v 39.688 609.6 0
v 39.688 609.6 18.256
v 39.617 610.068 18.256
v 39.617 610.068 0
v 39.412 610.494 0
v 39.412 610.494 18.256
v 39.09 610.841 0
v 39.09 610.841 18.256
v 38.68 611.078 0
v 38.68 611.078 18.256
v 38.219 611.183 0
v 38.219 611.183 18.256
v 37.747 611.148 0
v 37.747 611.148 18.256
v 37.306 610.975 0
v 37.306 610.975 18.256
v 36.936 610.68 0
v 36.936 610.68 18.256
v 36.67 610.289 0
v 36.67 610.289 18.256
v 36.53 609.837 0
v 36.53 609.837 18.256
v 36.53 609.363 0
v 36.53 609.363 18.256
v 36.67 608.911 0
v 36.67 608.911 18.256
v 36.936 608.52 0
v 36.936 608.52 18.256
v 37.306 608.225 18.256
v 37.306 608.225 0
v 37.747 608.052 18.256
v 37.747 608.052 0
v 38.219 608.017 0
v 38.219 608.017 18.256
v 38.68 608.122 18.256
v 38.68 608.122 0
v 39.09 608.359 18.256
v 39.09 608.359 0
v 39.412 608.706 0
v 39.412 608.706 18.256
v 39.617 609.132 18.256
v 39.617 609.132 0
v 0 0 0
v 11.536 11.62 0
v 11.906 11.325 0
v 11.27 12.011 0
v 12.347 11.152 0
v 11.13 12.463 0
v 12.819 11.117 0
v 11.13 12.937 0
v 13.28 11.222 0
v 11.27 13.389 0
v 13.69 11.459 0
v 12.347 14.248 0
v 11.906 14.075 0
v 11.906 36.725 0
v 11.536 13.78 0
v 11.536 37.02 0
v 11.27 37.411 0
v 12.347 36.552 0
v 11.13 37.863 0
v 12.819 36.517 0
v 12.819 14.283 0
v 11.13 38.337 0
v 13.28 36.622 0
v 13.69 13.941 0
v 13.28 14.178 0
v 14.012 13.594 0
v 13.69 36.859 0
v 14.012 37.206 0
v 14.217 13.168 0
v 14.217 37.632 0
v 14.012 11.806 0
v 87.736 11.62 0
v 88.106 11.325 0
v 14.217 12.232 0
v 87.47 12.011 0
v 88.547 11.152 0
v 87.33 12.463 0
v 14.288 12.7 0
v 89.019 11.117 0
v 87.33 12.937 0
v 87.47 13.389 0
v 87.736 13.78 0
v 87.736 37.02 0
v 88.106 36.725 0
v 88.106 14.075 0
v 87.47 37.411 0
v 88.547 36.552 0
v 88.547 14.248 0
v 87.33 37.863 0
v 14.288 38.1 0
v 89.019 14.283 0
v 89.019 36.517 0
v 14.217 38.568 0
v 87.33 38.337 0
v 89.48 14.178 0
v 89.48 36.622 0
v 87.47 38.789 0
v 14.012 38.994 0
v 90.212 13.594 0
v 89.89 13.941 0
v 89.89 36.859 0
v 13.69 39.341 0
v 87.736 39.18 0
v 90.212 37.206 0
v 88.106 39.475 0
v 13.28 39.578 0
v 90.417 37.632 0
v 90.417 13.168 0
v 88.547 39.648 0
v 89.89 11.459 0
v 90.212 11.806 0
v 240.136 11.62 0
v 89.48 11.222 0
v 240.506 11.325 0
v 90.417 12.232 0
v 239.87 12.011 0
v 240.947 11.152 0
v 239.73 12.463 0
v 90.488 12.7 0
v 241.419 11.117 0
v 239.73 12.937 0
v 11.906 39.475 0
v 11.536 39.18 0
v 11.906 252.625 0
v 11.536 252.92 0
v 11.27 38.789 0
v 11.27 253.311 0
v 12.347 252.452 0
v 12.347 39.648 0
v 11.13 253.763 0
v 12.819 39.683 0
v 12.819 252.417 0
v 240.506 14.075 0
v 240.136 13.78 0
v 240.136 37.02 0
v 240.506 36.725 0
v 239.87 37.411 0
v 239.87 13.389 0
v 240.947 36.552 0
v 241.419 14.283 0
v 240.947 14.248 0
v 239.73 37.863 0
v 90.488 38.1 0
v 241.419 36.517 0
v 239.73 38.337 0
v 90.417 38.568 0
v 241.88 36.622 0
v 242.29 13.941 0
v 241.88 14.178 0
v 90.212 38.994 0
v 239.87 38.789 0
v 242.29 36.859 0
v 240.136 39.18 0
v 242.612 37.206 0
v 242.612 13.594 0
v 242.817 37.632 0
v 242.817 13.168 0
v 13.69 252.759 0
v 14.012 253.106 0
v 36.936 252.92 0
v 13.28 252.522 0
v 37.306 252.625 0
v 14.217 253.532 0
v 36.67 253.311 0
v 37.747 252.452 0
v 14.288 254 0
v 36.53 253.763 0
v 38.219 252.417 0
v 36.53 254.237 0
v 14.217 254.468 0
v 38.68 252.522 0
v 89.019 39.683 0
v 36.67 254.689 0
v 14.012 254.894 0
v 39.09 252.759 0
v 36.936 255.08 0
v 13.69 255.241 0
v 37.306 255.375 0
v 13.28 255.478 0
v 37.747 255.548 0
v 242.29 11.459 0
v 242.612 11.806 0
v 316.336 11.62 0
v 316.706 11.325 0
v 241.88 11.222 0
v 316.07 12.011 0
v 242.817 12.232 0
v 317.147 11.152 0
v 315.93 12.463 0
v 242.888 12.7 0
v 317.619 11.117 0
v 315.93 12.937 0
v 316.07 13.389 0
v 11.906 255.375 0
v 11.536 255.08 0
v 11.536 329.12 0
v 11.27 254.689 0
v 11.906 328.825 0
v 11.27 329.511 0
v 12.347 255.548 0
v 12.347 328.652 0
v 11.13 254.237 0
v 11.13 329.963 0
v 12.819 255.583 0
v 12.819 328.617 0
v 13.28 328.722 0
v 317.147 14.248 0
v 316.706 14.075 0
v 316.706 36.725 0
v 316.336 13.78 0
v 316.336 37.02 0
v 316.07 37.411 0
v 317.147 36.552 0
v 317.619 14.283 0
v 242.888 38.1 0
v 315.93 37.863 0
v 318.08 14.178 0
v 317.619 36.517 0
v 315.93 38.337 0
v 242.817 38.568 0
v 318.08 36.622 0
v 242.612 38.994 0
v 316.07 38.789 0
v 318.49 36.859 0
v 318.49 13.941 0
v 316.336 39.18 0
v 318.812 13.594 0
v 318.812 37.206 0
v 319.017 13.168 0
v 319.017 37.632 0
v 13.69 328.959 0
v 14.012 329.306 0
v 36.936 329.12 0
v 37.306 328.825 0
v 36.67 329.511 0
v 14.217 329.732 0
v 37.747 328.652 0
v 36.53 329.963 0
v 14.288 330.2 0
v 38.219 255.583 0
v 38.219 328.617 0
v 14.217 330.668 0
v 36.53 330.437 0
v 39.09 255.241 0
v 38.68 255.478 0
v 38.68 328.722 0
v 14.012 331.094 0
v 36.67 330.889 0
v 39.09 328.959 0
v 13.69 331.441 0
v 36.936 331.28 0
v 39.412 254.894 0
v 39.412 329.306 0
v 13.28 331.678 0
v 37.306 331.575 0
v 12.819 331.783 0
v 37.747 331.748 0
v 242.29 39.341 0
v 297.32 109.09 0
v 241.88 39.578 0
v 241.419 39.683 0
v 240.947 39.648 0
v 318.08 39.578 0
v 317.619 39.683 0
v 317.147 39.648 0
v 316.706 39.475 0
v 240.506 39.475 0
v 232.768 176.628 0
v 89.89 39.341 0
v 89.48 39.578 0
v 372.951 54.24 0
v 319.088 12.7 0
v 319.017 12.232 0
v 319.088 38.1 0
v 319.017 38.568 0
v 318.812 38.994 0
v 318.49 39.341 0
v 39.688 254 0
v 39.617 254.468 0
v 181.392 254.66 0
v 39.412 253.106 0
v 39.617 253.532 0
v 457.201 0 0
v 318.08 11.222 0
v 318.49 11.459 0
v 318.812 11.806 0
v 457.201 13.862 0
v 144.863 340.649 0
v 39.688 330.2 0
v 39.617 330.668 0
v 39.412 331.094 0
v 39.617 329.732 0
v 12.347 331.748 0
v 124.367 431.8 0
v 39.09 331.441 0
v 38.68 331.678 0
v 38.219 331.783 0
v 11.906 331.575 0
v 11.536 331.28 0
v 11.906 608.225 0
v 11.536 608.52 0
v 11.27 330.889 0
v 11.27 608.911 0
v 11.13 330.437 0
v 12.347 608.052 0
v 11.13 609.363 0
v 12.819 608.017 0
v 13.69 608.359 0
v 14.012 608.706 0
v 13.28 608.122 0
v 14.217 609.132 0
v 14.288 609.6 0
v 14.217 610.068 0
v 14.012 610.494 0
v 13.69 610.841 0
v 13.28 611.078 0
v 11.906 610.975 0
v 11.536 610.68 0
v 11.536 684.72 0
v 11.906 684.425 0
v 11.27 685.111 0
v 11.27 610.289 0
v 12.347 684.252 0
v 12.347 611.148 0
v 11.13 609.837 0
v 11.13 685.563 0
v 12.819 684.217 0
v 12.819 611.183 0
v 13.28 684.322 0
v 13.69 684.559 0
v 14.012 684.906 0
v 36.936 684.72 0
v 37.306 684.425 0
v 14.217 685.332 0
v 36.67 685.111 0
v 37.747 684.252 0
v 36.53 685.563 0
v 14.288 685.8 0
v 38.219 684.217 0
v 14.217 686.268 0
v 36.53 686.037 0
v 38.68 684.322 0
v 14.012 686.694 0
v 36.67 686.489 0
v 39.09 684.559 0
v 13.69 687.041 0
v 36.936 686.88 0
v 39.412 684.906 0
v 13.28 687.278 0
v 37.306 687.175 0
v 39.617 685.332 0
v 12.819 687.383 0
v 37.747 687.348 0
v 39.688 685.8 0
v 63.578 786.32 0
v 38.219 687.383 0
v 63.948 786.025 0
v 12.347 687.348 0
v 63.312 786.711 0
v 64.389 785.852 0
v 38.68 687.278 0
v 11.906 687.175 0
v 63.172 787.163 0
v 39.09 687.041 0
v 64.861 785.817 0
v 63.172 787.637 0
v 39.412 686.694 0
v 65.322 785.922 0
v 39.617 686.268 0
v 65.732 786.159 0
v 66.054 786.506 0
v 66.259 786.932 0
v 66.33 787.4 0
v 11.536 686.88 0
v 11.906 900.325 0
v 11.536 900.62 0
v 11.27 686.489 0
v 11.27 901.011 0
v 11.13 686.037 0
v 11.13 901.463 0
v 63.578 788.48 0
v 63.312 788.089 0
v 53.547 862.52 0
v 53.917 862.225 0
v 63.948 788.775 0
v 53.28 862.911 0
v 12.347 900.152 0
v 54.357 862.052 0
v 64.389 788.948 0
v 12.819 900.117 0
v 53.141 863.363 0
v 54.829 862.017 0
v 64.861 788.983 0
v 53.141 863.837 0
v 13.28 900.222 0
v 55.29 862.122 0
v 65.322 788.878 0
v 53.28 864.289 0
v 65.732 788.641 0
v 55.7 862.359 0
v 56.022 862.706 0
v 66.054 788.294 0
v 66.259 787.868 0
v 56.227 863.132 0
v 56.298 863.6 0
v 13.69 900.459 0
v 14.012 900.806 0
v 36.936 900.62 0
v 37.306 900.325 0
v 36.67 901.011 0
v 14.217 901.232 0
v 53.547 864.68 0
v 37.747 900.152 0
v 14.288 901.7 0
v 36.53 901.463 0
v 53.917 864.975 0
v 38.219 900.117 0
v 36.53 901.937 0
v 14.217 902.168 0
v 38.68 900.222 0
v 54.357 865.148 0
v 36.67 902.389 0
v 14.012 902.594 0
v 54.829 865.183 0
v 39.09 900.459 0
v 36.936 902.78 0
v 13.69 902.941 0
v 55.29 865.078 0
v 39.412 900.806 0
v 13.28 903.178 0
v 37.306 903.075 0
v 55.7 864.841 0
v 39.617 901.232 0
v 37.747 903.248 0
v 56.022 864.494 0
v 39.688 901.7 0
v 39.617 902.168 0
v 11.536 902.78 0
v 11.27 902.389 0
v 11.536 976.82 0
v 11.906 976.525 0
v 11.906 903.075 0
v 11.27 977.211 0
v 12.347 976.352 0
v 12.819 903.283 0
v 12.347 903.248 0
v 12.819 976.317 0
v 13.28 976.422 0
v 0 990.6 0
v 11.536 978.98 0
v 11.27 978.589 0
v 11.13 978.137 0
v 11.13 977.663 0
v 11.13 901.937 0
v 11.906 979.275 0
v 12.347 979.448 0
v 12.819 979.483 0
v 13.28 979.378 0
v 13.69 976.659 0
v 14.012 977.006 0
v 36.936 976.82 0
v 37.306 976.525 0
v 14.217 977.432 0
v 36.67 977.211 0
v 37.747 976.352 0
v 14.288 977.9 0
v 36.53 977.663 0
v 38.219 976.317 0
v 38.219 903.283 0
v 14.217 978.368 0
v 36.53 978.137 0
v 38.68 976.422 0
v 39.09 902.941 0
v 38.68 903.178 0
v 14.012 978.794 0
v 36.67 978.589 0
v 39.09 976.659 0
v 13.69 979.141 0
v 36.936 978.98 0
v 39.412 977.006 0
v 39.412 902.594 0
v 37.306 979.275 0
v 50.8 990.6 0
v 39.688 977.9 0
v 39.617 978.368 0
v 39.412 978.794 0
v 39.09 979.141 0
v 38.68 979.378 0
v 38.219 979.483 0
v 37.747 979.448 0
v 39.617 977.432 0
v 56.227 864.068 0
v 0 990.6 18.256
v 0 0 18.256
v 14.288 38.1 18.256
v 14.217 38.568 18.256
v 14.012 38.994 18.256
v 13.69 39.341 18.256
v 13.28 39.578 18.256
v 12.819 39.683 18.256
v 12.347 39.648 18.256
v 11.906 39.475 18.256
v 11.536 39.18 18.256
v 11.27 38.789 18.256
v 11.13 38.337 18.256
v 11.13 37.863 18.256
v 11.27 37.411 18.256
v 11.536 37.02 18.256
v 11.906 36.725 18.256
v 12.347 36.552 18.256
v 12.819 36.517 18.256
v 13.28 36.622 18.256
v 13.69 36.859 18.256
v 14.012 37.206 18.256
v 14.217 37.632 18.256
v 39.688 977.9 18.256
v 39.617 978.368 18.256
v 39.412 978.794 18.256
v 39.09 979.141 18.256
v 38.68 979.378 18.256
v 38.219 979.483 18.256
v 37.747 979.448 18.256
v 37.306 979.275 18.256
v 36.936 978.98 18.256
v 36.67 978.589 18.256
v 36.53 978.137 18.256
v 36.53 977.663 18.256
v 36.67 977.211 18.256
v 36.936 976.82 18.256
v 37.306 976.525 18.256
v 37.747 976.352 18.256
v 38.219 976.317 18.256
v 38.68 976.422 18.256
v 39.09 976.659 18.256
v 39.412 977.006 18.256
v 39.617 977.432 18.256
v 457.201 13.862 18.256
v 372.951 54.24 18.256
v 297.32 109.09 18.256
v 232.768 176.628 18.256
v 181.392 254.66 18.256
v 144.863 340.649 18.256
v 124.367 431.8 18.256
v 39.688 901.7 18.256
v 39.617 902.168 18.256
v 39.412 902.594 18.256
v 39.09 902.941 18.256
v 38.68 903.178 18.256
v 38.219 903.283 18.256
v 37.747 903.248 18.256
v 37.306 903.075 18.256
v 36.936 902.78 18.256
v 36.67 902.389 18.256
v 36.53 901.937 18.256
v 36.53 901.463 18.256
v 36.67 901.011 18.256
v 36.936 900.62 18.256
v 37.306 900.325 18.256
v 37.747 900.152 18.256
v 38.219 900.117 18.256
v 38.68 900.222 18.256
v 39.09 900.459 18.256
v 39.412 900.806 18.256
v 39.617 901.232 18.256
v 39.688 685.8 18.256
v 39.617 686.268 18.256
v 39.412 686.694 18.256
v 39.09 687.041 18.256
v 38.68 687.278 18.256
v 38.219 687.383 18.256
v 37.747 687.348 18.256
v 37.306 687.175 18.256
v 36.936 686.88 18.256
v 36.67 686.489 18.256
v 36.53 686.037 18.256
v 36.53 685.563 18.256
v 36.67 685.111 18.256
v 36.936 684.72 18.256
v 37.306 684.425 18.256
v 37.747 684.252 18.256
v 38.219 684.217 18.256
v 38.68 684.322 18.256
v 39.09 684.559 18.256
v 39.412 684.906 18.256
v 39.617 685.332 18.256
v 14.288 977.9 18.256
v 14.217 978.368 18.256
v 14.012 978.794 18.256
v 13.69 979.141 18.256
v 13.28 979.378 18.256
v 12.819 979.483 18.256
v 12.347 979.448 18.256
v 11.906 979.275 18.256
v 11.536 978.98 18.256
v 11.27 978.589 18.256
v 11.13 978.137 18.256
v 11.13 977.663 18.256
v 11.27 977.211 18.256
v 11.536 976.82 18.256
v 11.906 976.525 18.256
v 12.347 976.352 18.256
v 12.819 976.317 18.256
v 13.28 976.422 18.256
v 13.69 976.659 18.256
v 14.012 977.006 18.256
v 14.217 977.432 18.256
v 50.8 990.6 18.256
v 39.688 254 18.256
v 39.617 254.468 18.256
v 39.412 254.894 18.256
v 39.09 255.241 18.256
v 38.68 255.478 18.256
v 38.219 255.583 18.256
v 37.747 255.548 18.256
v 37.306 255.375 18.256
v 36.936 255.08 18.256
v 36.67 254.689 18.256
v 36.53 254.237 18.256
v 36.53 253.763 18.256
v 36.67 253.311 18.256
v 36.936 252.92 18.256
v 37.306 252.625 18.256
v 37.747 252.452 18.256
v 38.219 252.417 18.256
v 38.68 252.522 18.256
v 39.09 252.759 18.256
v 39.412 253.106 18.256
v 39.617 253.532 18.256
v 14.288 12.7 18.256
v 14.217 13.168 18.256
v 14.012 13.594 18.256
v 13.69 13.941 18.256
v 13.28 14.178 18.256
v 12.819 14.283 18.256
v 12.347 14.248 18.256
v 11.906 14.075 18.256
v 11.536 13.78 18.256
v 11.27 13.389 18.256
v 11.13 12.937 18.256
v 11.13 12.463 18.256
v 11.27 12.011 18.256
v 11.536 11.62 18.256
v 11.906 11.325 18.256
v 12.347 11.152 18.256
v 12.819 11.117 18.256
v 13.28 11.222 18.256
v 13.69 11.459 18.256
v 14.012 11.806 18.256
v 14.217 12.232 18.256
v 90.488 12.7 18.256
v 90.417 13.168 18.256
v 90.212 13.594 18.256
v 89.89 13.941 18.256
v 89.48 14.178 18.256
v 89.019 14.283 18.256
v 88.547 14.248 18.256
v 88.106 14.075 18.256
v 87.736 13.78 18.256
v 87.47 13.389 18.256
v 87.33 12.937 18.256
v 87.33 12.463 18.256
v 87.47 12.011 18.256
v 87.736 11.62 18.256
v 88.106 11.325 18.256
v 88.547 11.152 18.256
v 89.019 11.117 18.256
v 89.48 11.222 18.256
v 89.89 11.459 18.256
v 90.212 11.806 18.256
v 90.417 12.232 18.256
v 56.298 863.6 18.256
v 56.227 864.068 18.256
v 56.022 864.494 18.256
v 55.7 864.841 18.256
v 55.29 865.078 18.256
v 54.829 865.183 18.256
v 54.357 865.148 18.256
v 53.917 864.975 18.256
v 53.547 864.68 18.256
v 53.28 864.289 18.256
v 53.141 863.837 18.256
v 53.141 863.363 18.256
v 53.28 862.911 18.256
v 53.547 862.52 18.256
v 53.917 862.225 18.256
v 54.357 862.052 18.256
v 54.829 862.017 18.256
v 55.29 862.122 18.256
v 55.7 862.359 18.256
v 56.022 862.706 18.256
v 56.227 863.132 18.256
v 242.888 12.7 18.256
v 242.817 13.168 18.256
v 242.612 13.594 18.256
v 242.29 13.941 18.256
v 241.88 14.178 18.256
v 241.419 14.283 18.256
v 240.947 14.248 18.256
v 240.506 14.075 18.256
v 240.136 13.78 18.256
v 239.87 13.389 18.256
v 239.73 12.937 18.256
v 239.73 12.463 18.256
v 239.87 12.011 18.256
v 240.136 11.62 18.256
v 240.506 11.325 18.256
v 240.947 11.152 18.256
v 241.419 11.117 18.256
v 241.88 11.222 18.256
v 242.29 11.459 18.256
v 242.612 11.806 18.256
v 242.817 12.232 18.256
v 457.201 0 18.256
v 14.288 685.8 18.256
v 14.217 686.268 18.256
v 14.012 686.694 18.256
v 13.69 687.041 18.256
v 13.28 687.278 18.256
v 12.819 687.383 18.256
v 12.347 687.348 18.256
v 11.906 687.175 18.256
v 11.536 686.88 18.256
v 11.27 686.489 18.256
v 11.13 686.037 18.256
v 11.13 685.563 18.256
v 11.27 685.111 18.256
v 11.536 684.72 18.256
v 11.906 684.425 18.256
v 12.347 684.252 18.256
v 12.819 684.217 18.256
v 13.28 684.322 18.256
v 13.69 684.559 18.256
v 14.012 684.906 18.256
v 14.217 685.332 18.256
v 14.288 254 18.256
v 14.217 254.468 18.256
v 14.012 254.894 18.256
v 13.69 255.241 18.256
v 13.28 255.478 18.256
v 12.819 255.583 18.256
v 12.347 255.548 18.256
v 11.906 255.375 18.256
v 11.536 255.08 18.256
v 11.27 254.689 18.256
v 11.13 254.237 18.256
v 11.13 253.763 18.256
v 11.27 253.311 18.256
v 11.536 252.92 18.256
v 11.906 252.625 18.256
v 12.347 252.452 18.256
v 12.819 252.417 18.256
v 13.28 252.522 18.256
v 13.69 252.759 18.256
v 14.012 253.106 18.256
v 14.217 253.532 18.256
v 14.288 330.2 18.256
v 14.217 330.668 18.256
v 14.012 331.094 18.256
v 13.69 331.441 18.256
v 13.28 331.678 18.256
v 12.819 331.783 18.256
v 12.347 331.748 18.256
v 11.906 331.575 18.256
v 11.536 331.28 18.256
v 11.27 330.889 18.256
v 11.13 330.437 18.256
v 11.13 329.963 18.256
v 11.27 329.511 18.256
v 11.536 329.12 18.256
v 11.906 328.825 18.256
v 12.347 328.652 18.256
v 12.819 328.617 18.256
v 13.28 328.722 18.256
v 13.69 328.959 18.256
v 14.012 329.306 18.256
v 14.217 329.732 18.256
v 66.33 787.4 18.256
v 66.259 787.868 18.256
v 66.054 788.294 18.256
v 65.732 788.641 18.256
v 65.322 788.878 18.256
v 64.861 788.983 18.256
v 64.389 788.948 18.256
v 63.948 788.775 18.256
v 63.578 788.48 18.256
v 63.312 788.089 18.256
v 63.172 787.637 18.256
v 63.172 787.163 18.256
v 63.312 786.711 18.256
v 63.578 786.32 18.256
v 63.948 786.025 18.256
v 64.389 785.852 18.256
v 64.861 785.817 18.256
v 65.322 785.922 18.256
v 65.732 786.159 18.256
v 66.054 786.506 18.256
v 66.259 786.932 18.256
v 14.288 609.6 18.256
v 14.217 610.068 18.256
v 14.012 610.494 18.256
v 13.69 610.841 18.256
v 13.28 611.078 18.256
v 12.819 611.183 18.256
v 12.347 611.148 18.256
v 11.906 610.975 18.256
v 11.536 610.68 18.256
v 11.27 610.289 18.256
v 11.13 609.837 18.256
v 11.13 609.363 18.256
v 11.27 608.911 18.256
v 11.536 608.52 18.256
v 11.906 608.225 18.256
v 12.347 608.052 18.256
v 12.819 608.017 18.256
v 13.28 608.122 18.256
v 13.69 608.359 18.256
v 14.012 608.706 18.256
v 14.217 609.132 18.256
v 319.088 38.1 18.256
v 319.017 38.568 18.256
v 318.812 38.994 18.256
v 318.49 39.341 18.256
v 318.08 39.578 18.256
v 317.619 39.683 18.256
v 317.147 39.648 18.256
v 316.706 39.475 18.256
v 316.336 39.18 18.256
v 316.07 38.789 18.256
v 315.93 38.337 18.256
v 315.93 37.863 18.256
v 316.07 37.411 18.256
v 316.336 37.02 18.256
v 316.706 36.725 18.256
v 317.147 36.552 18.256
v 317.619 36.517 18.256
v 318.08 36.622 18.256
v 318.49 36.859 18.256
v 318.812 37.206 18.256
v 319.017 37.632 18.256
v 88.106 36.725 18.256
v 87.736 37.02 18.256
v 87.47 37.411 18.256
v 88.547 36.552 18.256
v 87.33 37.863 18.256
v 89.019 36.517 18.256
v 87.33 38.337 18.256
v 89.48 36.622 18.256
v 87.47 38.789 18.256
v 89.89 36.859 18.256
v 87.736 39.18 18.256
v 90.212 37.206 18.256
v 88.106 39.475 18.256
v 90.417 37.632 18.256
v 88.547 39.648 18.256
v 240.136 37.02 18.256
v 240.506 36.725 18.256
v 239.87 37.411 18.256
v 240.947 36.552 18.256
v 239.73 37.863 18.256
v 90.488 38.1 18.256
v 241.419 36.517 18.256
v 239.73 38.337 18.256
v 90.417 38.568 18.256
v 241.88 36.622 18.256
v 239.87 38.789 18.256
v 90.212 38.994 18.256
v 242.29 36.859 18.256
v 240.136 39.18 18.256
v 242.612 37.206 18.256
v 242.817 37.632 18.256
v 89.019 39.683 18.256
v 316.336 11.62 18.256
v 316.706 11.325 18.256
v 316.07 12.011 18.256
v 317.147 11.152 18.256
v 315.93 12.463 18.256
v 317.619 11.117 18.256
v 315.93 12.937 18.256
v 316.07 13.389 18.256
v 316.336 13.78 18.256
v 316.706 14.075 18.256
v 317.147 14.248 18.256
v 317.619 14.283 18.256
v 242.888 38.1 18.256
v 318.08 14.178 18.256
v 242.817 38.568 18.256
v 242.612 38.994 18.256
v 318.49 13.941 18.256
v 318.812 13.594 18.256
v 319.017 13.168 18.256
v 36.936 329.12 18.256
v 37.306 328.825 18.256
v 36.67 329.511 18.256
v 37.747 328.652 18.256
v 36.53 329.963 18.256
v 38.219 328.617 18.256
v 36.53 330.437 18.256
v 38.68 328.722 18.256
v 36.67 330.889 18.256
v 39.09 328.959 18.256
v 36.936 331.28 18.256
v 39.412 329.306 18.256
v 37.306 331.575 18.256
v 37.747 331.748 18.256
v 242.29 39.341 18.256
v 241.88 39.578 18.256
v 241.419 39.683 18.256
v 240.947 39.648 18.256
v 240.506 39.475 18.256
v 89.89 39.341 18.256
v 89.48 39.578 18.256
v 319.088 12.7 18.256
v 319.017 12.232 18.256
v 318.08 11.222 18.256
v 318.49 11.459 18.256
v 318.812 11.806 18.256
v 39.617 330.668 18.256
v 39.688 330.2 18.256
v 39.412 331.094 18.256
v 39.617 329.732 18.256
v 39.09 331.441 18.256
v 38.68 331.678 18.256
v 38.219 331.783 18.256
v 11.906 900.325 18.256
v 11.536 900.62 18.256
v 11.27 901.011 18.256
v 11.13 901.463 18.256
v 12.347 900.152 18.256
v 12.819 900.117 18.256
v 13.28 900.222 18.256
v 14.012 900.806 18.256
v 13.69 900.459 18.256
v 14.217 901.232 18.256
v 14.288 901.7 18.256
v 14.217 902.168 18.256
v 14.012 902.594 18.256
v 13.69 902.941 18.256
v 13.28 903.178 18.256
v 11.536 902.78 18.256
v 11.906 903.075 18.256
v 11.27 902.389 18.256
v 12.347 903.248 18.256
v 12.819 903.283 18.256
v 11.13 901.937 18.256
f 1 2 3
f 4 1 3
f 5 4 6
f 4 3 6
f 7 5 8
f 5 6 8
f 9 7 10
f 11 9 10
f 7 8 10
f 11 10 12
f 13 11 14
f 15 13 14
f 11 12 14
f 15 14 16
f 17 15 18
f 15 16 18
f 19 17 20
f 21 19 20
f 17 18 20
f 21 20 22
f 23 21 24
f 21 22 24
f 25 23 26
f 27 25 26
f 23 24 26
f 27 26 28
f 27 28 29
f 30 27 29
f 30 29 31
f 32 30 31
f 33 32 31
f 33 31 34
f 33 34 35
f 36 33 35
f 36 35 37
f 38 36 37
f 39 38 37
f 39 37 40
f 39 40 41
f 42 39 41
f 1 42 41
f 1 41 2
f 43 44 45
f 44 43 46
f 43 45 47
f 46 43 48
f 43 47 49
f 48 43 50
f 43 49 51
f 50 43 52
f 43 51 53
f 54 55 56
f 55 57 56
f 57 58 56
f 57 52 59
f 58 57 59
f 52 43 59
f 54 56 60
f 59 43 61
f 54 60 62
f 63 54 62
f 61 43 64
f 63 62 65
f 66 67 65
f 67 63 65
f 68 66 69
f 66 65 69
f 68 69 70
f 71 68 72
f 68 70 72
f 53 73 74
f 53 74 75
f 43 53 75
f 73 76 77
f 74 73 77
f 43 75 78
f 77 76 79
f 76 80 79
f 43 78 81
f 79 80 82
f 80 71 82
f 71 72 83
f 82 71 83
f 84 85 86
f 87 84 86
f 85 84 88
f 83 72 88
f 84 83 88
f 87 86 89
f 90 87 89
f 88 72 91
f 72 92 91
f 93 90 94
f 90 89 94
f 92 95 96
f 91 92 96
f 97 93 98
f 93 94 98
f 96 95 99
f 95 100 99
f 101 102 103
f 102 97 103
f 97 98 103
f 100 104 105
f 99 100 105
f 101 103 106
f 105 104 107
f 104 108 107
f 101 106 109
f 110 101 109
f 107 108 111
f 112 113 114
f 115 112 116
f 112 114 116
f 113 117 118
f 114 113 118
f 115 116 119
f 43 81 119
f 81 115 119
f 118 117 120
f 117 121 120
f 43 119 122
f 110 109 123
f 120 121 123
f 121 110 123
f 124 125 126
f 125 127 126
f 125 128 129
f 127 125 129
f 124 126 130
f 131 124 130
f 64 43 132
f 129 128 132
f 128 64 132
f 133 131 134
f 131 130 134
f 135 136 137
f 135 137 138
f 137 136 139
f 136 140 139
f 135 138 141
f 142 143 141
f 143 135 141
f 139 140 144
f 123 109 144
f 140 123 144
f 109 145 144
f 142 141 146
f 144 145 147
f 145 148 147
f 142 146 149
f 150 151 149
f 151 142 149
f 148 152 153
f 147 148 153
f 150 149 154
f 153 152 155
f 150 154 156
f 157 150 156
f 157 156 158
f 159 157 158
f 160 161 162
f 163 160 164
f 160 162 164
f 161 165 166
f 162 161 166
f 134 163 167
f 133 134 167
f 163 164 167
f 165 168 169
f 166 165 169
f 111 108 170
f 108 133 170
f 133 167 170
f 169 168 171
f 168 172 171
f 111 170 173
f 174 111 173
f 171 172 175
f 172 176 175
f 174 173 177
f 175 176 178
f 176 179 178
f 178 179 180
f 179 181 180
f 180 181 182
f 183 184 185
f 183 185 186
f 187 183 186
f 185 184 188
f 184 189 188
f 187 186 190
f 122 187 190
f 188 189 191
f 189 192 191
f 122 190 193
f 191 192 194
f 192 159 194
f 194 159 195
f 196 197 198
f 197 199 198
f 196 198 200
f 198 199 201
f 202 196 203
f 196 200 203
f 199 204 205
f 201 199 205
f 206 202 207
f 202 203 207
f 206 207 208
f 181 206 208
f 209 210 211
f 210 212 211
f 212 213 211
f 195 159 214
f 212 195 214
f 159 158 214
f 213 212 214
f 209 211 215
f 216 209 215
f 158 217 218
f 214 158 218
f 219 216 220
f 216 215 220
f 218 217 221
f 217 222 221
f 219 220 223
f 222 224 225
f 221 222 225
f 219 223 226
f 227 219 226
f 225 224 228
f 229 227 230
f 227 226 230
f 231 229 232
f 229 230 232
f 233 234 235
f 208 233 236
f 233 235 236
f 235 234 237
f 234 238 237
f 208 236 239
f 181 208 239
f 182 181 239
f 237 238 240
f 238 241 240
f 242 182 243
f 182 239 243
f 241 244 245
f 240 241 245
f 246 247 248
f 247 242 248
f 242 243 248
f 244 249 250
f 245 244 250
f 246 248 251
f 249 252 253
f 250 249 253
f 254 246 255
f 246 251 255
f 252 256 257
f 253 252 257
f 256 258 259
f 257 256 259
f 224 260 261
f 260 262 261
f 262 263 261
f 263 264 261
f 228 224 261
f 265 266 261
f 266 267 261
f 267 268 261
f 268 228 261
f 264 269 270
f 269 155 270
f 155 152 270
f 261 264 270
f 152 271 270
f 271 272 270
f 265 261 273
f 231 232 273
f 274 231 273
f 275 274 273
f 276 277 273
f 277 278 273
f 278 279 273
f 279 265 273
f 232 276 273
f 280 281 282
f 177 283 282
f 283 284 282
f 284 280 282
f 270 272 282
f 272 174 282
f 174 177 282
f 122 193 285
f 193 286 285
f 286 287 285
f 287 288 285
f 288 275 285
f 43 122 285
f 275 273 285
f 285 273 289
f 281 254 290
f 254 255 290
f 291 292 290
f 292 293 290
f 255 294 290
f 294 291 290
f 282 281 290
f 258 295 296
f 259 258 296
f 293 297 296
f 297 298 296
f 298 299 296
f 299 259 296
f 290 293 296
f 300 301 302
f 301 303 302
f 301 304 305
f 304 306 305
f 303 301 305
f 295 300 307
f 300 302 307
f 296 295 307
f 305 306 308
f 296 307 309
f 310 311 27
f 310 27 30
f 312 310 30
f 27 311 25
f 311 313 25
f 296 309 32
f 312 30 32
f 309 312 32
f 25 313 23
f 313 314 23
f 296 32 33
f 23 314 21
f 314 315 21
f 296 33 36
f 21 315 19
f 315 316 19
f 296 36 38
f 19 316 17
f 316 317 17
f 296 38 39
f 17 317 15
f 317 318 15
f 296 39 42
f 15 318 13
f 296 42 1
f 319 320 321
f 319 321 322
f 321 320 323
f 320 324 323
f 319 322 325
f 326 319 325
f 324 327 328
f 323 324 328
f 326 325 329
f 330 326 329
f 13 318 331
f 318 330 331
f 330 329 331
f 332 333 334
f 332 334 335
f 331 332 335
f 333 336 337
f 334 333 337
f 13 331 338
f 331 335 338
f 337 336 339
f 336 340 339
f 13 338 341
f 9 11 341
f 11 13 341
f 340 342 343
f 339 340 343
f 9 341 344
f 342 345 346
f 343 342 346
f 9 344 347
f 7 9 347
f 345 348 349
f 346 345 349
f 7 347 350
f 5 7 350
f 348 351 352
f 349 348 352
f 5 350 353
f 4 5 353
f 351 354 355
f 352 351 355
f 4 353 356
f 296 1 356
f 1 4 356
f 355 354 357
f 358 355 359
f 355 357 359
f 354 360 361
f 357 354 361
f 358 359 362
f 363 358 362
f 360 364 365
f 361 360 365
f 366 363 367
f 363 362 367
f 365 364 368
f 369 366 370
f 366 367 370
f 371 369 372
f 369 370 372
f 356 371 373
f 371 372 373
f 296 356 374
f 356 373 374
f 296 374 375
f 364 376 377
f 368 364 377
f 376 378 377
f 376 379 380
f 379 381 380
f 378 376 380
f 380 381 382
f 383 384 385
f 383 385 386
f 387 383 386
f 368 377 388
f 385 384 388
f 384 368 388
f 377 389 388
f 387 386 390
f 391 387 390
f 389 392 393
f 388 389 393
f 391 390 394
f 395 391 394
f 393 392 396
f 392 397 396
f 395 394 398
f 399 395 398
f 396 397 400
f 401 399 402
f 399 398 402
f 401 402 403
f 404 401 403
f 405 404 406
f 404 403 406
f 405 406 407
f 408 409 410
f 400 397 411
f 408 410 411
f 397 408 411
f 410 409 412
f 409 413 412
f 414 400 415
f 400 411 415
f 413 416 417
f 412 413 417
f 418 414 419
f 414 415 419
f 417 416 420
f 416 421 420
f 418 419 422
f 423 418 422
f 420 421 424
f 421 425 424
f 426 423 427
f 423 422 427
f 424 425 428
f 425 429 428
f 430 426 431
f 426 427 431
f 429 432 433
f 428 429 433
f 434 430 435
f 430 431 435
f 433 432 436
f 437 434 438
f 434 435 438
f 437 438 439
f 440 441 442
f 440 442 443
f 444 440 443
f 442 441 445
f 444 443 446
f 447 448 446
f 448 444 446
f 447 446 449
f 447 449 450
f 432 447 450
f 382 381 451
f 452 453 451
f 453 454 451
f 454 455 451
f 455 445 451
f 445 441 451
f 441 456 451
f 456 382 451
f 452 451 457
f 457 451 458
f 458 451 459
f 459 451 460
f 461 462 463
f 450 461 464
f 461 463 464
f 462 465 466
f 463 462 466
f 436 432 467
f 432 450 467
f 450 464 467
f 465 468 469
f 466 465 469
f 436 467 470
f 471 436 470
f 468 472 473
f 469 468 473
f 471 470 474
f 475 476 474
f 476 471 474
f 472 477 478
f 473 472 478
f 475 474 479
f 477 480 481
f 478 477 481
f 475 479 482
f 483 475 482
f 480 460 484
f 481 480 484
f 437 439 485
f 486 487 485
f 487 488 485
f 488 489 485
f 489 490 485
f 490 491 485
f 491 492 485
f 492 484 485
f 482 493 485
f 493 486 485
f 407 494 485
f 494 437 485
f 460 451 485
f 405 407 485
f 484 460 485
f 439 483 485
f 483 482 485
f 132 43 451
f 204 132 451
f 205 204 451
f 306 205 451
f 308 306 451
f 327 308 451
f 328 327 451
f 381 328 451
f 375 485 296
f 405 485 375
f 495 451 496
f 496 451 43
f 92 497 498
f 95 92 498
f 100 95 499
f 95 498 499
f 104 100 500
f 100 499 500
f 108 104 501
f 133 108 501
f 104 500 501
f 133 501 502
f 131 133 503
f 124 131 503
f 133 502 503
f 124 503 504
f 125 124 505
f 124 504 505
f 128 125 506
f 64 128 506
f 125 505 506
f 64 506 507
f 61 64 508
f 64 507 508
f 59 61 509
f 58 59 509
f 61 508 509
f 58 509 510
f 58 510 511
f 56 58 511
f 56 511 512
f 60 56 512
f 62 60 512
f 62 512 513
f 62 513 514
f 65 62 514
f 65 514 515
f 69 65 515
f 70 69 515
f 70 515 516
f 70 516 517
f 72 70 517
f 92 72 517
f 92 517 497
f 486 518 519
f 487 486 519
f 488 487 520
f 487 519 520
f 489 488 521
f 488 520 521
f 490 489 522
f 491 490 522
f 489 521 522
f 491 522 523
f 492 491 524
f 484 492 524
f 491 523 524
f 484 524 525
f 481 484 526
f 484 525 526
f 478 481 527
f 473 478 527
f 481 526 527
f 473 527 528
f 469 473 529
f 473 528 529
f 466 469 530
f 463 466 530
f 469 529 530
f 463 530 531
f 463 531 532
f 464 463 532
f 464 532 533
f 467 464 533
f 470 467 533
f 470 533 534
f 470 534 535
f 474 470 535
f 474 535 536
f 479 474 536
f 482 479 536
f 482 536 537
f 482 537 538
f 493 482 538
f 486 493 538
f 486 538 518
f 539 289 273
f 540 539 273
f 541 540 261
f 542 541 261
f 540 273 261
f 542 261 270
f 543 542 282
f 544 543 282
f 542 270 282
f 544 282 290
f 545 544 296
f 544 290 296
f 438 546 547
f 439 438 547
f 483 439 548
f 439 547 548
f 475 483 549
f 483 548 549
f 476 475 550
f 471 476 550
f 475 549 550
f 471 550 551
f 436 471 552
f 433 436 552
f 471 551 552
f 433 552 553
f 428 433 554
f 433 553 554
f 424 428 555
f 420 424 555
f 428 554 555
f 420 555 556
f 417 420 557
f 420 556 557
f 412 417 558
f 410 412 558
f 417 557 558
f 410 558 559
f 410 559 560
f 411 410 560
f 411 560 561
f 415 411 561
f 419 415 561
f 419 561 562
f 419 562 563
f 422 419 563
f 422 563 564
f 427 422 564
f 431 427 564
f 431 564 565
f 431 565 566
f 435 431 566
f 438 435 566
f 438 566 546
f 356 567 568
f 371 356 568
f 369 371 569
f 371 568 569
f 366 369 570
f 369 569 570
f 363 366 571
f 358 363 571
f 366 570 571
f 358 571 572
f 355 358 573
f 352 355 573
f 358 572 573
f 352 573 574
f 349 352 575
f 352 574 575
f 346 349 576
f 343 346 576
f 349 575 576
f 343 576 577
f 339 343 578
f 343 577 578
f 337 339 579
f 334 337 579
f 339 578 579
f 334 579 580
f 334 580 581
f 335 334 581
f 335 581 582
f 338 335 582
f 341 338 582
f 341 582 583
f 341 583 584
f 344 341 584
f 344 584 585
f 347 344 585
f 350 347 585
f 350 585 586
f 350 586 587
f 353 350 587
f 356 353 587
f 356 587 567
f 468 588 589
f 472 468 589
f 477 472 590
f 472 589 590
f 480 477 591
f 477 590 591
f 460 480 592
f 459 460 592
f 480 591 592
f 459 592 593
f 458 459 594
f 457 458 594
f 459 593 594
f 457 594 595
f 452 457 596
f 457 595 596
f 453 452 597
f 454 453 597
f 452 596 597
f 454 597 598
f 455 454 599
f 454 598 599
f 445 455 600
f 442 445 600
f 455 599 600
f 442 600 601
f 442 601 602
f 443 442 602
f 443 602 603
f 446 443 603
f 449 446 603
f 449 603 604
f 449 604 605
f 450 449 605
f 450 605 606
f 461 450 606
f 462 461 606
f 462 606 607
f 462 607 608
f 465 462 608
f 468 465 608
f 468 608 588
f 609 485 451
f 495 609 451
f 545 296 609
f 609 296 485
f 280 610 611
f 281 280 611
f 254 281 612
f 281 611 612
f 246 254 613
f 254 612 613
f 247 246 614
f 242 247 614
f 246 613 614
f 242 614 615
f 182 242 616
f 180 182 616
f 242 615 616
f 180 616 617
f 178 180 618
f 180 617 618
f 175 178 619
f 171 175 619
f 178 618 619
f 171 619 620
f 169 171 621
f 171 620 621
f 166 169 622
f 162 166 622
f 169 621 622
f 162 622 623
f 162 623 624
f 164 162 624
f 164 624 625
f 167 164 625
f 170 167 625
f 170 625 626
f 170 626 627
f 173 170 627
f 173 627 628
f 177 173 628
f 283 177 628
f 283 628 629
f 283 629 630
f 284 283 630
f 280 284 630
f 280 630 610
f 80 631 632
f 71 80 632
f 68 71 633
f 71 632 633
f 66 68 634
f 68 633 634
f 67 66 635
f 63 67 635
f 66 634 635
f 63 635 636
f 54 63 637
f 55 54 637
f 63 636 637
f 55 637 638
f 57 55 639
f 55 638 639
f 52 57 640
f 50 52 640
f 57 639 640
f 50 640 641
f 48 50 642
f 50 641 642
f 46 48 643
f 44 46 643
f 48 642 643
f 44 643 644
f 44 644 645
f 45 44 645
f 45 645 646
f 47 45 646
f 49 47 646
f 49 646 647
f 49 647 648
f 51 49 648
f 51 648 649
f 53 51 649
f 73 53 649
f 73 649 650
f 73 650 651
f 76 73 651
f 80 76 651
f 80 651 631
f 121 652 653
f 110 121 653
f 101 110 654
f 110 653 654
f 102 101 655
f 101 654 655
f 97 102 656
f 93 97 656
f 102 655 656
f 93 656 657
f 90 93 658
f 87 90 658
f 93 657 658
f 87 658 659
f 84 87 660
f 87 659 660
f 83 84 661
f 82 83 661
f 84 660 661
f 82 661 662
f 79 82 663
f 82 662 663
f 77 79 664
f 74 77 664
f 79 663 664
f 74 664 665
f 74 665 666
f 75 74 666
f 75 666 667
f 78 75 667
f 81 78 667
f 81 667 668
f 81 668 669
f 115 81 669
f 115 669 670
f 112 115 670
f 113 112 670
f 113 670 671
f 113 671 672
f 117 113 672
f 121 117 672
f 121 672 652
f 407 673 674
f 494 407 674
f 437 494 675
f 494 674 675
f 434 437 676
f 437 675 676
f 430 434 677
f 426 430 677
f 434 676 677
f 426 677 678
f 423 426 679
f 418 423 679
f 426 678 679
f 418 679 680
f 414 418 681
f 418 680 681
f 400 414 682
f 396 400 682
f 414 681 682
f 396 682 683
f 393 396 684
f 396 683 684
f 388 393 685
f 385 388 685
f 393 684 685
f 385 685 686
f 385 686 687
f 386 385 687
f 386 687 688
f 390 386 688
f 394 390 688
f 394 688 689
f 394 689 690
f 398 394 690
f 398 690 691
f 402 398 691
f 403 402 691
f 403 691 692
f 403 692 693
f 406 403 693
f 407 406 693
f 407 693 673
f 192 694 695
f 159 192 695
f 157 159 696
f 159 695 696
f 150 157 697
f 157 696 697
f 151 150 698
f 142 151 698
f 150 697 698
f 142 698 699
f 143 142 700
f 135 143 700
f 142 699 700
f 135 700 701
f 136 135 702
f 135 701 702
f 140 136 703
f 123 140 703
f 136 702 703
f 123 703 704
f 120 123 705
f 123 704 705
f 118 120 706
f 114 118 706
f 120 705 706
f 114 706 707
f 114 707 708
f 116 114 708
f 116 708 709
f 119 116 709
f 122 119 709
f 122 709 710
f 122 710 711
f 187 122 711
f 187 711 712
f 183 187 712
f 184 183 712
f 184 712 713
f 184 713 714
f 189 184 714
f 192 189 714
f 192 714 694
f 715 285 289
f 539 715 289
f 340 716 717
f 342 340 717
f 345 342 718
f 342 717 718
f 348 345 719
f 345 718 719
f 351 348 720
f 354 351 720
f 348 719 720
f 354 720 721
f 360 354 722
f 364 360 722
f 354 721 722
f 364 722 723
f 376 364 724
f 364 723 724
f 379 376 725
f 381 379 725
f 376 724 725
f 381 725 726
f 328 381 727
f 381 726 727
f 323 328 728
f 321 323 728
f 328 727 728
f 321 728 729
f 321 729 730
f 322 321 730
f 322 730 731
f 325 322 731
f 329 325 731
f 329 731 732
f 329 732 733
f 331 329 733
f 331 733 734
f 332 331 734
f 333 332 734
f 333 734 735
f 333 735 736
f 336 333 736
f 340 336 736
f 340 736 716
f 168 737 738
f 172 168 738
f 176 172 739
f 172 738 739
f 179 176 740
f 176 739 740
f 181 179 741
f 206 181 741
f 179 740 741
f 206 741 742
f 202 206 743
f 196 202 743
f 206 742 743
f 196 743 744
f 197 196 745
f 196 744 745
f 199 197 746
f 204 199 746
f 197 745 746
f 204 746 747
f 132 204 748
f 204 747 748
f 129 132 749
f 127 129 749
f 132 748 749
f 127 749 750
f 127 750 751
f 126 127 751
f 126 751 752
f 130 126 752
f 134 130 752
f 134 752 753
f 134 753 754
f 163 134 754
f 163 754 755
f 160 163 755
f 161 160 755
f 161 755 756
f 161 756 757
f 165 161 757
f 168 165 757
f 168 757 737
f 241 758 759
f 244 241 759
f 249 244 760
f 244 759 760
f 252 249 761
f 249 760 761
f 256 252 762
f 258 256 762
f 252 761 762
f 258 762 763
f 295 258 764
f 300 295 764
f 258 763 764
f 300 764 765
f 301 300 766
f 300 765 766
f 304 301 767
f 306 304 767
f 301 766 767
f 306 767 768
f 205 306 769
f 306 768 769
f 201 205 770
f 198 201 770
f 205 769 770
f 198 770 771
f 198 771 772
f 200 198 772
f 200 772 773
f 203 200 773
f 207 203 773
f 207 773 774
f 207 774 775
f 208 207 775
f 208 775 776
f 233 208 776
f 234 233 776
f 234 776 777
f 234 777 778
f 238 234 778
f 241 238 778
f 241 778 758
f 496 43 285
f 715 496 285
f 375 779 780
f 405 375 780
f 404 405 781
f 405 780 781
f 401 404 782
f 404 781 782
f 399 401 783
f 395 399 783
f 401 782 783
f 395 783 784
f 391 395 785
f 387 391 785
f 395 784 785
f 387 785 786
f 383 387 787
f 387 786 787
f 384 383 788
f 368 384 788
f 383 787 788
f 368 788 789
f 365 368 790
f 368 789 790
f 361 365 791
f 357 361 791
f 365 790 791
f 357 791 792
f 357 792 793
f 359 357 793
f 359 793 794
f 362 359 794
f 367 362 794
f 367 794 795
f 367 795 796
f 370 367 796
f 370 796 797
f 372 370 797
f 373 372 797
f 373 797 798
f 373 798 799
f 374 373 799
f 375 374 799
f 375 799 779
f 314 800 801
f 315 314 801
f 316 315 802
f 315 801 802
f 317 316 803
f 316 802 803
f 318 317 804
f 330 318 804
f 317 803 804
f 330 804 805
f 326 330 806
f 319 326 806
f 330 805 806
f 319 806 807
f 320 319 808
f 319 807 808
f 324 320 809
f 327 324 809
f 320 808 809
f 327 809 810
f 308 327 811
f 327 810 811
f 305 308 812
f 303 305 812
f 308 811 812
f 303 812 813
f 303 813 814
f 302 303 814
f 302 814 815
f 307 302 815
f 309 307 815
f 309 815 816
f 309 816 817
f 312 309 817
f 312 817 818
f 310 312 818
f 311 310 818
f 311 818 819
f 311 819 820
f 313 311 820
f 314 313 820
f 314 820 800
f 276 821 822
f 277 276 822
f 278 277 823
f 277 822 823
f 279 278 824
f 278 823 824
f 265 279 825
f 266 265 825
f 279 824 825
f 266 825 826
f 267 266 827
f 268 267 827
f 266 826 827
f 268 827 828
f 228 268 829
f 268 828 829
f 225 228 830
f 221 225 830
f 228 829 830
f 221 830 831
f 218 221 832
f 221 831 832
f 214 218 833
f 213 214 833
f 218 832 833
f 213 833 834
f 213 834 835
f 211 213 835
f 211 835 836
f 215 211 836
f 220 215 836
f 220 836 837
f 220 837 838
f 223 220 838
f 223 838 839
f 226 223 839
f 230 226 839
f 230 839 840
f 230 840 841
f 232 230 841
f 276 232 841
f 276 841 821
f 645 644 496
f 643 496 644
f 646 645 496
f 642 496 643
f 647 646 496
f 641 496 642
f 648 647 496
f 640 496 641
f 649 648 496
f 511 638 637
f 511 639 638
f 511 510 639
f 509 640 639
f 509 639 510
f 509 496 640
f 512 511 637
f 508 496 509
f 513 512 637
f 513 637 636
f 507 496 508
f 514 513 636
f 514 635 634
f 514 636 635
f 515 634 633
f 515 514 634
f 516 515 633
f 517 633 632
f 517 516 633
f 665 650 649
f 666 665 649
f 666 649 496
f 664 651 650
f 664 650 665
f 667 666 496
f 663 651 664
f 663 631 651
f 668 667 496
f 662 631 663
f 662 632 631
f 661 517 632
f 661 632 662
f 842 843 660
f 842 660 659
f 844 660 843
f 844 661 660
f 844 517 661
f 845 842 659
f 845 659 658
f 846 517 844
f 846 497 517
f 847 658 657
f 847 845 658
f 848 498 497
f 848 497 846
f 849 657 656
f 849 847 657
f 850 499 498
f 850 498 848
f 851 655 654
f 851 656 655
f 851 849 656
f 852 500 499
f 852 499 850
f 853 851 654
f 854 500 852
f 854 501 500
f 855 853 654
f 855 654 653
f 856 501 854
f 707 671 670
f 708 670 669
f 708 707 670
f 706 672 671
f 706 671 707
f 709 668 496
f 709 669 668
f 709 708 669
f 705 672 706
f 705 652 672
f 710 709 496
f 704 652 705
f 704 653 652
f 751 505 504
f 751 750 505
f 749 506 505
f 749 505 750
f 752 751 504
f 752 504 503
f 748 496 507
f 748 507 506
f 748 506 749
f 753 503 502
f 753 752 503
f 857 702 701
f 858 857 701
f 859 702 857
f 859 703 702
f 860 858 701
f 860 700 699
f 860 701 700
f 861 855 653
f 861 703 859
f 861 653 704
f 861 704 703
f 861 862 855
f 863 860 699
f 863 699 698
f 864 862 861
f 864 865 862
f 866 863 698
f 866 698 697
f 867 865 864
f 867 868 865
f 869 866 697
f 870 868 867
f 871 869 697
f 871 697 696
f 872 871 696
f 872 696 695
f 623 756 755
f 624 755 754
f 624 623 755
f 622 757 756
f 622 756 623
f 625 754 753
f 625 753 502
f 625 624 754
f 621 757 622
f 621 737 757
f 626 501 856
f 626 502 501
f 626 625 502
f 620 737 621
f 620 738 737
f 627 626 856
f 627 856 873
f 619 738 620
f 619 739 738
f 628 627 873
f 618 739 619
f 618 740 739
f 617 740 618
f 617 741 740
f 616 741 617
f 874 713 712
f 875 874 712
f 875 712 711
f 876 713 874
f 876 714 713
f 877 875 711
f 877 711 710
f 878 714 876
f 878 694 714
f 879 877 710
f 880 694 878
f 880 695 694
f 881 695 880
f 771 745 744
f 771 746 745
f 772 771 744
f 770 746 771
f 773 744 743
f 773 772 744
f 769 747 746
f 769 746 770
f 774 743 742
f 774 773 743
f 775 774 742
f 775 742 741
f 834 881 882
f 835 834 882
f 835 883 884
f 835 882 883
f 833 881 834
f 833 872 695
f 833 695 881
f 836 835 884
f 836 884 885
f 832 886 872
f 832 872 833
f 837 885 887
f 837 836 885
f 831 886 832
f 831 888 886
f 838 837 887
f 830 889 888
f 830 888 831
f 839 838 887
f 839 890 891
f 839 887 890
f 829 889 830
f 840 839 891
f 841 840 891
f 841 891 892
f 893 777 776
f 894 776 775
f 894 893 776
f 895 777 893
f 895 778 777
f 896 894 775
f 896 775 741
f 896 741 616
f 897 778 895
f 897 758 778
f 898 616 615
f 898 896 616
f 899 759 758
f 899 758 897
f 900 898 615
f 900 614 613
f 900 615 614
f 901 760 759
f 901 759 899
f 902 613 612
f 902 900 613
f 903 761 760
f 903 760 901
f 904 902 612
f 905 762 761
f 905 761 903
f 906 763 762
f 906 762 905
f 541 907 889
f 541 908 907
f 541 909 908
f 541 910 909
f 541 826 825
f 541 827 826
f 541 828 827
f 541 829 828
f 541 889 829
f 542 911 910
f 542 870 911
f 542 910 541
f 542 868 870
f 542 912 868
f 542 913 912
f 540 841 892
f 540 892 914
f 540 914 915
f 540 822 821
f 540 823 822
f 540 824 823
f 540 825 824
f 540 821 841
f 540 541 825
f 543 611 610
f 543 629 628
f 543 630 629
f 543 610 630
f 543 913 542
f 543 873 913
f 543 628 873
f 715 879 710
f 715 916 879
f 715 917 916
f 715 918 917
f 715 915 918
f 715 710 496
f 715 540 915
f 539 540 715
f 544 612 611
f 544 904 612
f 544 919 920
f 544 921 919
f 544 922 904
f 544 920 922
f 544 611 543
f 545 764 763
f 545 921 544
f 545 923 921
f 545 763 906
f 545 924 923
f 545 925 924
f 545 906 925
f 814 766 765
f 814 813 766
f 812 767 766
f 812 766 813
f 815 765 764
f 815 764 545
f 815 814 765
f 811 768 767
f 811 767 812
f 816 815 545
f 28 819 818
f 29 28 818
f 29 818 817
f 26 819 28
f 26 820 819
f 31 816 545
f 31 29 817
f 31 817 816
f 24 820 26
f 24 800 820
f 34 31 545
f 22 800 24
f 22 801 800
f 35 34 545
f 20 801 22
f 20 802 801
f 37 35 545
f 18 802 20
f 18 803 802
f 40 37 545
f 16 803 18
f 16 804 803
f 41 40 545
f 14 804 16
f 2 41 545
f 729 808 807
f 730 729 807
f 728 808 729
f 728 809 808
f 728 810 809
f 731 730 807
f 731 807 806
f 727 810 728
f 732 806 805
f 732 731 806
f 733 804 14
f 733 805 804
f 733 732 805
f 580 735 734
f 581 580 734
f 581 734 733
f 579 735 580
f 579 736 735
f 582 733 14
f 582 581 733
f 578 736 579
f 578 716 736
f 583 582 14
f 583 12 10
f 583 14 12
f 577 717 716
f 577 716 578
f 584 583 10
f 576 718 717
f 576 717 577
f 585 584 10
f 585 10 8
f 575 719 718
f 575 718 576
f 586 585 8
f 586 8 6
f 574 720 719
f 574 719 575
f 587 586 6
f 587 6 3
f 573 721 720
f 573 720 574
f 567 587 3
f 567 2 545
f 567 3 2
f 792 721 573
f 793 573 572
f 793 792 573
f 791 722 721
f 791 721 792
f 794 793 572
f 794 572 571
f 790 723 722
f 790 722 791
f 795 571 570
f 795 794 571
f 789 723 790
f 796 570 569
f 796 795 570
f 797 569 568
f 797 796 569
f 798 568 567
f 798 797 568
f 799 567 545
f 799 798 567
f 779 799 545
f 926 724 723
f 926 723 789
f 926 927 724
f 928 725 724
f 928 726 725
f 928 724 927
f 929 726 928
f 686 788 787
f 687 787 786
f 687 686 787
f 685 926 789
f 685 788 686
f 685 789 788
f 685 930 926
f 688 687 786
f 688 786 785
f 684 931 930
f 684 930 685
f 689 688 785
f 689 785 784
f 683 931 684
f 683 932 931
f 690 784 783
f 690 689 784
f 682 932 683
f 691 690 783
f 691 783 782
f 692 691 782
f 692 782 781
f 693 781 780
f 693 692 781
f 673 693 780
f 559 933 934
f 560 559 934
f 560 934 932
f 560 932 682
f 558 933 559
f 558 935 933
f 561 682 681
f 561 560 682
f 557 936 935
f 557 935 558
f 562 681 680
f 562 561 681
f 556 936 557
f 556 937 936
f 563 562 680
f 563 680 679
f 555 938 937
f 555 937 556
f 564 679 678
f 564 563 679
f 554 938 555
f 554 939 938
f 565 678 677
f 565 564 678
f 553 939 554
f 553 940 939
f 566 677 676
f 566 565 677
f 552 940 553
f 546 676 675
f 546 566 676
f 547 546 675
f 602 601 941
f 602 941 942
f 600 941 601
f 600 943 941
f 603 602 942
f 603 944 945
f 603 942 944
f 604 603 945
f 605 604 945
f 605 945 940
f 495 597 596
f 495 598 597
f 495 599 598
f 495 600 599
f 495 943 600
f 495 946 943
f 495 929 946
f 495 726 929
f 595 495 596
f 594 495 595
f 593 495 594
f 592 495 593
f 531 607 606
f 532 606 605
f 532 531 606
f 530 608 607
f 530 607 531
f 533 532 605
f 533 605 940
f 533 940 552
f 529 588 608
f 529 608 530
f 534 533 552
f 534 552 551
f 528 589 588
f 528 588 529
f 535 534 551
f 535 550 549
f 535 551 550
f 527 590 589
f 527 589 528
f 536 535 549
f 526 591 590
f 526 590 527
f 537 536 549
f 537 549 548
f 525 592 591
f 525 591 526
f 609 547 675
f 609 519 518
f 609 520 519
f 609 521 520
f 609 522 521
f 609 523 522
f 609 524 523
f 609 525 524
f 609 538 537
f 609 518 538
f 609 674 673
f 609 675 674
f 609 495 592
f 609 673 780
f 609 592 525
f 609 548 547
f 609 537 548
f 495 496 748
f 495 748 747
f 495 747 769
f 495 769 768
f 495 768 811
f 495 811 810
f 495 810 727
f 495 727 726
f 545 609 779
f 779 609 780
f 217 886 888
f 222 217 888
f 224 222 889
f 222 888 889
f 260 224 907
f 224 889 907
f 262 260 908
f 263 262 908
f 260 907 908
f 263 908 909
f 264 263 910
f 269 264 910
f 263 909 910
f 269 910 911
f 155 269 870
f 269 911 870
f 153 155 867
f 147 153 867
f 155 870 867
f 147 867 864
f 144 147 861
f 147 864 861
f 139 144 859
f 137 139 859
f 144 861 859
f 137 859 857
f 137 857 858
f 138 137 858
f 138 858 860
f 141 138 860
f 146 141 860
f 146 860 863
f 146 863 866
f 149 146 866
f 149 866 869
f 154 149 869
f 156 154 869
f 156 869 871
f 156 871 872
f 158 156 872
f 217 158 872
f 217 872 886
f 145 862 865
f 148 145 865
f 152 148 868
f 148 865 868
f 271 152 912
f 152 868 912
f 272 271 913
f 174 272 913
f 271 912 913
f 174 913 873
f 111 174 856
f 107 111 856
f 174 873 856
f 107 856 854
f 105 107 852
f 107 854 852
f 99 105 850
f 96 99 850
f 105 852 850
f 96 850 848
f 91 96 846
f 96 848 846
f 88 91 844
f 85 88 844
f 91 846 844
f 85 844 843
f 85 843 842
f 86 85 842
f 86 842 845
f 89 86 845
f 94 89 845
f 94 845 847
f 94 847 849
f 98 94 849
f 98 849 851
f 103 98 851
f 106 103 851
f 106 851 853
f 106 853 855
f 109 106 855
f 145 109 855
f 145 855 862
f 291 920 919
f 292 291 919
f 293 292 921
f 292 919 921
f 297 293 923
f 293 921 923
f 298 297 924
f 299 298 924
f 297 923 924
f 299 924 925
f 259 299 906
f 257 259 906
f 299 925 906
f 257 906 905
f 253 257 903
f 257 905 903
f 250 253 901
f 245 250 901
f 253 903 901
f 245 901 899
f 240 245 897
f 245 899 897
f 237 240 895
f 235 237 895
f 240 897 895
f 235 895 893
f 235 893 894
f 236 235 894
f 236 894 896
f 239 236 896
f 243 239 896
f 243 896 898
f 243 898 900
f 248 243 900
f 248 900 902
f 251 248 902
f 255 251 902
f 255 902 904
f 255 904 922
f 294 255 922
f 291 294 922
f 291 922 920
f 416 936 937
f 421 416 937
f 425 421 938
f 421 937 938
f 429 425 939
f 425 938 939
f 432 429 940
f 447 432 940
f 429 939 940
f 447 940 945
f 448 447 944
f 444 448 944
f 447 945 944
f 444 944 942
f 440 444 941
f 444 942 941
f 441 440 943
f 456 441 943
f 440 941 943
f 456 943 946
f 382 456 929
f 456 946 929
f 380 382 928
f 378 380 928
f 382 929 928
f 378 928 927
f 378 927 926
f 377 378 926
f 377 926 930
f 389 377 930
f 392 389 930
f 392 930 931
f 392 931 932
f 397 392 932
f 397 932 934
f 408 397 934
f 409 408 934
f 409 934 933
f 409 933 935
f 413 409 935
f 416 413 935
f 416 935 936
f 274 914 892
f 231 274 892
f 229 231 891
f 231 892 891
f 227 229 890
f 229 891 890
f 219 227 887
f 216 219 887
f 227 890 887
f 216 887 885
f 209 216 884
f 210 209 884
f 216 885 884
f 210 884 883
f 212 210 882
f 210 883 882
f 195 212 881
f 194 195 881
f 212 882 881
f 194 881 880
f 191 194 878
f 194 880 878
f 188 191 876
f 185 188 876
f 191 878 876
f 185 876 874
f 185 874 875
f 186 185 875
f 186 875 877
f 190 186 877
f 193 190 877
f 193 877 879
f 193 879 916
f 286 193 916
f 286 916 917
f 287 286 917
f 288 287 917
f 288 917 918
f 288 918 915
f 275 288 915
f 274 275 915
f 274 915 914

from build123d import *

# Parameters (mm, degrees)
BOSS_EXTRUDE1_DEPTH = 18.25625
SKETCH2_R           = 1.5875
CUT_EXTRUDE1_DEPTH  = 1092.171116308
SKETCH3_R           = 1.5875
CUT_EXTRUDE2_DEPTH  = 1092.171116308


with BuildPart() as part:
    # Sketch1 → Boss-Extrude1 (new body)
    with BuildSketch(Plane.XY):
        with BuildLine():
            Line((0, 990.6), (0, 0))
            Line((0, 0), (457.201, 0))
            Line((457.201, 0), (457.201, 13.862038208))
            ThreePointArc((457.201, 13.862038208), (232.767577124, 176.628269142), (124.367415652, 431.8))
            Line((124.367415652, 431.8), (50.8, 990.6))
            Line((50.8, 990.6), (0, 990.6))
        make_face()
    extrude(amount=BOSS_EXTRUDE1_DEPTH)

    # Sketch2 → Cut-Extrude1 (cut, through all)
    with BuildSketch(Plane.XY.offset(18.25625)):
        with Locations((12.7, 977.9)):
            Circle(SKETCH2_R)
        with Locations((38.1, 977.9)):
            Circle(SKETCH2_R)
        with Locations((12.7, 901.7)):
            Circle(SKETCH2_R)
        with Locations((38.1, 901.7)):
            Circle(SKETCH2_R)
        with Locations((12.7, 609.6)):
            Circle(SKETCH2_R)
        with Locations((38.1, 609.6)):
            Circle(SKETCH2_R)
        with Locations((12.7, 685.8)):
            Circle(SKETCH2_R)
        with Locations((38.1, 685.8)):
            Circle(SKETCH2_R)
        with Locations((12.7, 254)):
            Circle(SKETCH2_R)
        with Locations((38.1, 254)):
            Circle(SKETCH2_R)
        with Locations((12.7, 330.2)):
            Circle(SKETCH2_R)
        with Locations((38.1, 330.2)):
            Circle(SKETCH2_R)
        with Locations((12.7, 38.1)):
            Circle(SKETCH2_R)
        with Locations((12.7, 12.7)):
            Circle(SKETCH2_R)
        with Locations((88.9, 38.1)):
            Circle(SKETCH2_R)
        with Locations((88.9, 12.7)):
            Circle(SKETCH2_R)
        with Locations((241.3, 38.1)):
            Circle(SKETCH2_R)
        with Locations((317.5, 38.1)):
            Circle(SKETCH2_R)
        with Locations((241.3, 12.7)):
            Circle(SKETCH2_R)
        with Locations((317.5, 12.7)):
            Circle(SKETCH2_R)
    extrude(amount=-CUT_EXTRUDE1_DEPTH, mode=Mode.SUBTRACT)

    # Sketch3 → Cut-Extrude2 (cut, through all)
    with BuildSketch(Plane.XY.offset(18.25625)):
        with Locations((64.74219971, 787.4)):
            Circle(SKETCH3_R)
        with Locations((54.710279394, 863.6)):
            Circle(SKETCH3_R)
    extrude(amount=-CUT_EXTRUDE2_DEPTH, mode=Mode.SUBTRACT)


solid = part.part
